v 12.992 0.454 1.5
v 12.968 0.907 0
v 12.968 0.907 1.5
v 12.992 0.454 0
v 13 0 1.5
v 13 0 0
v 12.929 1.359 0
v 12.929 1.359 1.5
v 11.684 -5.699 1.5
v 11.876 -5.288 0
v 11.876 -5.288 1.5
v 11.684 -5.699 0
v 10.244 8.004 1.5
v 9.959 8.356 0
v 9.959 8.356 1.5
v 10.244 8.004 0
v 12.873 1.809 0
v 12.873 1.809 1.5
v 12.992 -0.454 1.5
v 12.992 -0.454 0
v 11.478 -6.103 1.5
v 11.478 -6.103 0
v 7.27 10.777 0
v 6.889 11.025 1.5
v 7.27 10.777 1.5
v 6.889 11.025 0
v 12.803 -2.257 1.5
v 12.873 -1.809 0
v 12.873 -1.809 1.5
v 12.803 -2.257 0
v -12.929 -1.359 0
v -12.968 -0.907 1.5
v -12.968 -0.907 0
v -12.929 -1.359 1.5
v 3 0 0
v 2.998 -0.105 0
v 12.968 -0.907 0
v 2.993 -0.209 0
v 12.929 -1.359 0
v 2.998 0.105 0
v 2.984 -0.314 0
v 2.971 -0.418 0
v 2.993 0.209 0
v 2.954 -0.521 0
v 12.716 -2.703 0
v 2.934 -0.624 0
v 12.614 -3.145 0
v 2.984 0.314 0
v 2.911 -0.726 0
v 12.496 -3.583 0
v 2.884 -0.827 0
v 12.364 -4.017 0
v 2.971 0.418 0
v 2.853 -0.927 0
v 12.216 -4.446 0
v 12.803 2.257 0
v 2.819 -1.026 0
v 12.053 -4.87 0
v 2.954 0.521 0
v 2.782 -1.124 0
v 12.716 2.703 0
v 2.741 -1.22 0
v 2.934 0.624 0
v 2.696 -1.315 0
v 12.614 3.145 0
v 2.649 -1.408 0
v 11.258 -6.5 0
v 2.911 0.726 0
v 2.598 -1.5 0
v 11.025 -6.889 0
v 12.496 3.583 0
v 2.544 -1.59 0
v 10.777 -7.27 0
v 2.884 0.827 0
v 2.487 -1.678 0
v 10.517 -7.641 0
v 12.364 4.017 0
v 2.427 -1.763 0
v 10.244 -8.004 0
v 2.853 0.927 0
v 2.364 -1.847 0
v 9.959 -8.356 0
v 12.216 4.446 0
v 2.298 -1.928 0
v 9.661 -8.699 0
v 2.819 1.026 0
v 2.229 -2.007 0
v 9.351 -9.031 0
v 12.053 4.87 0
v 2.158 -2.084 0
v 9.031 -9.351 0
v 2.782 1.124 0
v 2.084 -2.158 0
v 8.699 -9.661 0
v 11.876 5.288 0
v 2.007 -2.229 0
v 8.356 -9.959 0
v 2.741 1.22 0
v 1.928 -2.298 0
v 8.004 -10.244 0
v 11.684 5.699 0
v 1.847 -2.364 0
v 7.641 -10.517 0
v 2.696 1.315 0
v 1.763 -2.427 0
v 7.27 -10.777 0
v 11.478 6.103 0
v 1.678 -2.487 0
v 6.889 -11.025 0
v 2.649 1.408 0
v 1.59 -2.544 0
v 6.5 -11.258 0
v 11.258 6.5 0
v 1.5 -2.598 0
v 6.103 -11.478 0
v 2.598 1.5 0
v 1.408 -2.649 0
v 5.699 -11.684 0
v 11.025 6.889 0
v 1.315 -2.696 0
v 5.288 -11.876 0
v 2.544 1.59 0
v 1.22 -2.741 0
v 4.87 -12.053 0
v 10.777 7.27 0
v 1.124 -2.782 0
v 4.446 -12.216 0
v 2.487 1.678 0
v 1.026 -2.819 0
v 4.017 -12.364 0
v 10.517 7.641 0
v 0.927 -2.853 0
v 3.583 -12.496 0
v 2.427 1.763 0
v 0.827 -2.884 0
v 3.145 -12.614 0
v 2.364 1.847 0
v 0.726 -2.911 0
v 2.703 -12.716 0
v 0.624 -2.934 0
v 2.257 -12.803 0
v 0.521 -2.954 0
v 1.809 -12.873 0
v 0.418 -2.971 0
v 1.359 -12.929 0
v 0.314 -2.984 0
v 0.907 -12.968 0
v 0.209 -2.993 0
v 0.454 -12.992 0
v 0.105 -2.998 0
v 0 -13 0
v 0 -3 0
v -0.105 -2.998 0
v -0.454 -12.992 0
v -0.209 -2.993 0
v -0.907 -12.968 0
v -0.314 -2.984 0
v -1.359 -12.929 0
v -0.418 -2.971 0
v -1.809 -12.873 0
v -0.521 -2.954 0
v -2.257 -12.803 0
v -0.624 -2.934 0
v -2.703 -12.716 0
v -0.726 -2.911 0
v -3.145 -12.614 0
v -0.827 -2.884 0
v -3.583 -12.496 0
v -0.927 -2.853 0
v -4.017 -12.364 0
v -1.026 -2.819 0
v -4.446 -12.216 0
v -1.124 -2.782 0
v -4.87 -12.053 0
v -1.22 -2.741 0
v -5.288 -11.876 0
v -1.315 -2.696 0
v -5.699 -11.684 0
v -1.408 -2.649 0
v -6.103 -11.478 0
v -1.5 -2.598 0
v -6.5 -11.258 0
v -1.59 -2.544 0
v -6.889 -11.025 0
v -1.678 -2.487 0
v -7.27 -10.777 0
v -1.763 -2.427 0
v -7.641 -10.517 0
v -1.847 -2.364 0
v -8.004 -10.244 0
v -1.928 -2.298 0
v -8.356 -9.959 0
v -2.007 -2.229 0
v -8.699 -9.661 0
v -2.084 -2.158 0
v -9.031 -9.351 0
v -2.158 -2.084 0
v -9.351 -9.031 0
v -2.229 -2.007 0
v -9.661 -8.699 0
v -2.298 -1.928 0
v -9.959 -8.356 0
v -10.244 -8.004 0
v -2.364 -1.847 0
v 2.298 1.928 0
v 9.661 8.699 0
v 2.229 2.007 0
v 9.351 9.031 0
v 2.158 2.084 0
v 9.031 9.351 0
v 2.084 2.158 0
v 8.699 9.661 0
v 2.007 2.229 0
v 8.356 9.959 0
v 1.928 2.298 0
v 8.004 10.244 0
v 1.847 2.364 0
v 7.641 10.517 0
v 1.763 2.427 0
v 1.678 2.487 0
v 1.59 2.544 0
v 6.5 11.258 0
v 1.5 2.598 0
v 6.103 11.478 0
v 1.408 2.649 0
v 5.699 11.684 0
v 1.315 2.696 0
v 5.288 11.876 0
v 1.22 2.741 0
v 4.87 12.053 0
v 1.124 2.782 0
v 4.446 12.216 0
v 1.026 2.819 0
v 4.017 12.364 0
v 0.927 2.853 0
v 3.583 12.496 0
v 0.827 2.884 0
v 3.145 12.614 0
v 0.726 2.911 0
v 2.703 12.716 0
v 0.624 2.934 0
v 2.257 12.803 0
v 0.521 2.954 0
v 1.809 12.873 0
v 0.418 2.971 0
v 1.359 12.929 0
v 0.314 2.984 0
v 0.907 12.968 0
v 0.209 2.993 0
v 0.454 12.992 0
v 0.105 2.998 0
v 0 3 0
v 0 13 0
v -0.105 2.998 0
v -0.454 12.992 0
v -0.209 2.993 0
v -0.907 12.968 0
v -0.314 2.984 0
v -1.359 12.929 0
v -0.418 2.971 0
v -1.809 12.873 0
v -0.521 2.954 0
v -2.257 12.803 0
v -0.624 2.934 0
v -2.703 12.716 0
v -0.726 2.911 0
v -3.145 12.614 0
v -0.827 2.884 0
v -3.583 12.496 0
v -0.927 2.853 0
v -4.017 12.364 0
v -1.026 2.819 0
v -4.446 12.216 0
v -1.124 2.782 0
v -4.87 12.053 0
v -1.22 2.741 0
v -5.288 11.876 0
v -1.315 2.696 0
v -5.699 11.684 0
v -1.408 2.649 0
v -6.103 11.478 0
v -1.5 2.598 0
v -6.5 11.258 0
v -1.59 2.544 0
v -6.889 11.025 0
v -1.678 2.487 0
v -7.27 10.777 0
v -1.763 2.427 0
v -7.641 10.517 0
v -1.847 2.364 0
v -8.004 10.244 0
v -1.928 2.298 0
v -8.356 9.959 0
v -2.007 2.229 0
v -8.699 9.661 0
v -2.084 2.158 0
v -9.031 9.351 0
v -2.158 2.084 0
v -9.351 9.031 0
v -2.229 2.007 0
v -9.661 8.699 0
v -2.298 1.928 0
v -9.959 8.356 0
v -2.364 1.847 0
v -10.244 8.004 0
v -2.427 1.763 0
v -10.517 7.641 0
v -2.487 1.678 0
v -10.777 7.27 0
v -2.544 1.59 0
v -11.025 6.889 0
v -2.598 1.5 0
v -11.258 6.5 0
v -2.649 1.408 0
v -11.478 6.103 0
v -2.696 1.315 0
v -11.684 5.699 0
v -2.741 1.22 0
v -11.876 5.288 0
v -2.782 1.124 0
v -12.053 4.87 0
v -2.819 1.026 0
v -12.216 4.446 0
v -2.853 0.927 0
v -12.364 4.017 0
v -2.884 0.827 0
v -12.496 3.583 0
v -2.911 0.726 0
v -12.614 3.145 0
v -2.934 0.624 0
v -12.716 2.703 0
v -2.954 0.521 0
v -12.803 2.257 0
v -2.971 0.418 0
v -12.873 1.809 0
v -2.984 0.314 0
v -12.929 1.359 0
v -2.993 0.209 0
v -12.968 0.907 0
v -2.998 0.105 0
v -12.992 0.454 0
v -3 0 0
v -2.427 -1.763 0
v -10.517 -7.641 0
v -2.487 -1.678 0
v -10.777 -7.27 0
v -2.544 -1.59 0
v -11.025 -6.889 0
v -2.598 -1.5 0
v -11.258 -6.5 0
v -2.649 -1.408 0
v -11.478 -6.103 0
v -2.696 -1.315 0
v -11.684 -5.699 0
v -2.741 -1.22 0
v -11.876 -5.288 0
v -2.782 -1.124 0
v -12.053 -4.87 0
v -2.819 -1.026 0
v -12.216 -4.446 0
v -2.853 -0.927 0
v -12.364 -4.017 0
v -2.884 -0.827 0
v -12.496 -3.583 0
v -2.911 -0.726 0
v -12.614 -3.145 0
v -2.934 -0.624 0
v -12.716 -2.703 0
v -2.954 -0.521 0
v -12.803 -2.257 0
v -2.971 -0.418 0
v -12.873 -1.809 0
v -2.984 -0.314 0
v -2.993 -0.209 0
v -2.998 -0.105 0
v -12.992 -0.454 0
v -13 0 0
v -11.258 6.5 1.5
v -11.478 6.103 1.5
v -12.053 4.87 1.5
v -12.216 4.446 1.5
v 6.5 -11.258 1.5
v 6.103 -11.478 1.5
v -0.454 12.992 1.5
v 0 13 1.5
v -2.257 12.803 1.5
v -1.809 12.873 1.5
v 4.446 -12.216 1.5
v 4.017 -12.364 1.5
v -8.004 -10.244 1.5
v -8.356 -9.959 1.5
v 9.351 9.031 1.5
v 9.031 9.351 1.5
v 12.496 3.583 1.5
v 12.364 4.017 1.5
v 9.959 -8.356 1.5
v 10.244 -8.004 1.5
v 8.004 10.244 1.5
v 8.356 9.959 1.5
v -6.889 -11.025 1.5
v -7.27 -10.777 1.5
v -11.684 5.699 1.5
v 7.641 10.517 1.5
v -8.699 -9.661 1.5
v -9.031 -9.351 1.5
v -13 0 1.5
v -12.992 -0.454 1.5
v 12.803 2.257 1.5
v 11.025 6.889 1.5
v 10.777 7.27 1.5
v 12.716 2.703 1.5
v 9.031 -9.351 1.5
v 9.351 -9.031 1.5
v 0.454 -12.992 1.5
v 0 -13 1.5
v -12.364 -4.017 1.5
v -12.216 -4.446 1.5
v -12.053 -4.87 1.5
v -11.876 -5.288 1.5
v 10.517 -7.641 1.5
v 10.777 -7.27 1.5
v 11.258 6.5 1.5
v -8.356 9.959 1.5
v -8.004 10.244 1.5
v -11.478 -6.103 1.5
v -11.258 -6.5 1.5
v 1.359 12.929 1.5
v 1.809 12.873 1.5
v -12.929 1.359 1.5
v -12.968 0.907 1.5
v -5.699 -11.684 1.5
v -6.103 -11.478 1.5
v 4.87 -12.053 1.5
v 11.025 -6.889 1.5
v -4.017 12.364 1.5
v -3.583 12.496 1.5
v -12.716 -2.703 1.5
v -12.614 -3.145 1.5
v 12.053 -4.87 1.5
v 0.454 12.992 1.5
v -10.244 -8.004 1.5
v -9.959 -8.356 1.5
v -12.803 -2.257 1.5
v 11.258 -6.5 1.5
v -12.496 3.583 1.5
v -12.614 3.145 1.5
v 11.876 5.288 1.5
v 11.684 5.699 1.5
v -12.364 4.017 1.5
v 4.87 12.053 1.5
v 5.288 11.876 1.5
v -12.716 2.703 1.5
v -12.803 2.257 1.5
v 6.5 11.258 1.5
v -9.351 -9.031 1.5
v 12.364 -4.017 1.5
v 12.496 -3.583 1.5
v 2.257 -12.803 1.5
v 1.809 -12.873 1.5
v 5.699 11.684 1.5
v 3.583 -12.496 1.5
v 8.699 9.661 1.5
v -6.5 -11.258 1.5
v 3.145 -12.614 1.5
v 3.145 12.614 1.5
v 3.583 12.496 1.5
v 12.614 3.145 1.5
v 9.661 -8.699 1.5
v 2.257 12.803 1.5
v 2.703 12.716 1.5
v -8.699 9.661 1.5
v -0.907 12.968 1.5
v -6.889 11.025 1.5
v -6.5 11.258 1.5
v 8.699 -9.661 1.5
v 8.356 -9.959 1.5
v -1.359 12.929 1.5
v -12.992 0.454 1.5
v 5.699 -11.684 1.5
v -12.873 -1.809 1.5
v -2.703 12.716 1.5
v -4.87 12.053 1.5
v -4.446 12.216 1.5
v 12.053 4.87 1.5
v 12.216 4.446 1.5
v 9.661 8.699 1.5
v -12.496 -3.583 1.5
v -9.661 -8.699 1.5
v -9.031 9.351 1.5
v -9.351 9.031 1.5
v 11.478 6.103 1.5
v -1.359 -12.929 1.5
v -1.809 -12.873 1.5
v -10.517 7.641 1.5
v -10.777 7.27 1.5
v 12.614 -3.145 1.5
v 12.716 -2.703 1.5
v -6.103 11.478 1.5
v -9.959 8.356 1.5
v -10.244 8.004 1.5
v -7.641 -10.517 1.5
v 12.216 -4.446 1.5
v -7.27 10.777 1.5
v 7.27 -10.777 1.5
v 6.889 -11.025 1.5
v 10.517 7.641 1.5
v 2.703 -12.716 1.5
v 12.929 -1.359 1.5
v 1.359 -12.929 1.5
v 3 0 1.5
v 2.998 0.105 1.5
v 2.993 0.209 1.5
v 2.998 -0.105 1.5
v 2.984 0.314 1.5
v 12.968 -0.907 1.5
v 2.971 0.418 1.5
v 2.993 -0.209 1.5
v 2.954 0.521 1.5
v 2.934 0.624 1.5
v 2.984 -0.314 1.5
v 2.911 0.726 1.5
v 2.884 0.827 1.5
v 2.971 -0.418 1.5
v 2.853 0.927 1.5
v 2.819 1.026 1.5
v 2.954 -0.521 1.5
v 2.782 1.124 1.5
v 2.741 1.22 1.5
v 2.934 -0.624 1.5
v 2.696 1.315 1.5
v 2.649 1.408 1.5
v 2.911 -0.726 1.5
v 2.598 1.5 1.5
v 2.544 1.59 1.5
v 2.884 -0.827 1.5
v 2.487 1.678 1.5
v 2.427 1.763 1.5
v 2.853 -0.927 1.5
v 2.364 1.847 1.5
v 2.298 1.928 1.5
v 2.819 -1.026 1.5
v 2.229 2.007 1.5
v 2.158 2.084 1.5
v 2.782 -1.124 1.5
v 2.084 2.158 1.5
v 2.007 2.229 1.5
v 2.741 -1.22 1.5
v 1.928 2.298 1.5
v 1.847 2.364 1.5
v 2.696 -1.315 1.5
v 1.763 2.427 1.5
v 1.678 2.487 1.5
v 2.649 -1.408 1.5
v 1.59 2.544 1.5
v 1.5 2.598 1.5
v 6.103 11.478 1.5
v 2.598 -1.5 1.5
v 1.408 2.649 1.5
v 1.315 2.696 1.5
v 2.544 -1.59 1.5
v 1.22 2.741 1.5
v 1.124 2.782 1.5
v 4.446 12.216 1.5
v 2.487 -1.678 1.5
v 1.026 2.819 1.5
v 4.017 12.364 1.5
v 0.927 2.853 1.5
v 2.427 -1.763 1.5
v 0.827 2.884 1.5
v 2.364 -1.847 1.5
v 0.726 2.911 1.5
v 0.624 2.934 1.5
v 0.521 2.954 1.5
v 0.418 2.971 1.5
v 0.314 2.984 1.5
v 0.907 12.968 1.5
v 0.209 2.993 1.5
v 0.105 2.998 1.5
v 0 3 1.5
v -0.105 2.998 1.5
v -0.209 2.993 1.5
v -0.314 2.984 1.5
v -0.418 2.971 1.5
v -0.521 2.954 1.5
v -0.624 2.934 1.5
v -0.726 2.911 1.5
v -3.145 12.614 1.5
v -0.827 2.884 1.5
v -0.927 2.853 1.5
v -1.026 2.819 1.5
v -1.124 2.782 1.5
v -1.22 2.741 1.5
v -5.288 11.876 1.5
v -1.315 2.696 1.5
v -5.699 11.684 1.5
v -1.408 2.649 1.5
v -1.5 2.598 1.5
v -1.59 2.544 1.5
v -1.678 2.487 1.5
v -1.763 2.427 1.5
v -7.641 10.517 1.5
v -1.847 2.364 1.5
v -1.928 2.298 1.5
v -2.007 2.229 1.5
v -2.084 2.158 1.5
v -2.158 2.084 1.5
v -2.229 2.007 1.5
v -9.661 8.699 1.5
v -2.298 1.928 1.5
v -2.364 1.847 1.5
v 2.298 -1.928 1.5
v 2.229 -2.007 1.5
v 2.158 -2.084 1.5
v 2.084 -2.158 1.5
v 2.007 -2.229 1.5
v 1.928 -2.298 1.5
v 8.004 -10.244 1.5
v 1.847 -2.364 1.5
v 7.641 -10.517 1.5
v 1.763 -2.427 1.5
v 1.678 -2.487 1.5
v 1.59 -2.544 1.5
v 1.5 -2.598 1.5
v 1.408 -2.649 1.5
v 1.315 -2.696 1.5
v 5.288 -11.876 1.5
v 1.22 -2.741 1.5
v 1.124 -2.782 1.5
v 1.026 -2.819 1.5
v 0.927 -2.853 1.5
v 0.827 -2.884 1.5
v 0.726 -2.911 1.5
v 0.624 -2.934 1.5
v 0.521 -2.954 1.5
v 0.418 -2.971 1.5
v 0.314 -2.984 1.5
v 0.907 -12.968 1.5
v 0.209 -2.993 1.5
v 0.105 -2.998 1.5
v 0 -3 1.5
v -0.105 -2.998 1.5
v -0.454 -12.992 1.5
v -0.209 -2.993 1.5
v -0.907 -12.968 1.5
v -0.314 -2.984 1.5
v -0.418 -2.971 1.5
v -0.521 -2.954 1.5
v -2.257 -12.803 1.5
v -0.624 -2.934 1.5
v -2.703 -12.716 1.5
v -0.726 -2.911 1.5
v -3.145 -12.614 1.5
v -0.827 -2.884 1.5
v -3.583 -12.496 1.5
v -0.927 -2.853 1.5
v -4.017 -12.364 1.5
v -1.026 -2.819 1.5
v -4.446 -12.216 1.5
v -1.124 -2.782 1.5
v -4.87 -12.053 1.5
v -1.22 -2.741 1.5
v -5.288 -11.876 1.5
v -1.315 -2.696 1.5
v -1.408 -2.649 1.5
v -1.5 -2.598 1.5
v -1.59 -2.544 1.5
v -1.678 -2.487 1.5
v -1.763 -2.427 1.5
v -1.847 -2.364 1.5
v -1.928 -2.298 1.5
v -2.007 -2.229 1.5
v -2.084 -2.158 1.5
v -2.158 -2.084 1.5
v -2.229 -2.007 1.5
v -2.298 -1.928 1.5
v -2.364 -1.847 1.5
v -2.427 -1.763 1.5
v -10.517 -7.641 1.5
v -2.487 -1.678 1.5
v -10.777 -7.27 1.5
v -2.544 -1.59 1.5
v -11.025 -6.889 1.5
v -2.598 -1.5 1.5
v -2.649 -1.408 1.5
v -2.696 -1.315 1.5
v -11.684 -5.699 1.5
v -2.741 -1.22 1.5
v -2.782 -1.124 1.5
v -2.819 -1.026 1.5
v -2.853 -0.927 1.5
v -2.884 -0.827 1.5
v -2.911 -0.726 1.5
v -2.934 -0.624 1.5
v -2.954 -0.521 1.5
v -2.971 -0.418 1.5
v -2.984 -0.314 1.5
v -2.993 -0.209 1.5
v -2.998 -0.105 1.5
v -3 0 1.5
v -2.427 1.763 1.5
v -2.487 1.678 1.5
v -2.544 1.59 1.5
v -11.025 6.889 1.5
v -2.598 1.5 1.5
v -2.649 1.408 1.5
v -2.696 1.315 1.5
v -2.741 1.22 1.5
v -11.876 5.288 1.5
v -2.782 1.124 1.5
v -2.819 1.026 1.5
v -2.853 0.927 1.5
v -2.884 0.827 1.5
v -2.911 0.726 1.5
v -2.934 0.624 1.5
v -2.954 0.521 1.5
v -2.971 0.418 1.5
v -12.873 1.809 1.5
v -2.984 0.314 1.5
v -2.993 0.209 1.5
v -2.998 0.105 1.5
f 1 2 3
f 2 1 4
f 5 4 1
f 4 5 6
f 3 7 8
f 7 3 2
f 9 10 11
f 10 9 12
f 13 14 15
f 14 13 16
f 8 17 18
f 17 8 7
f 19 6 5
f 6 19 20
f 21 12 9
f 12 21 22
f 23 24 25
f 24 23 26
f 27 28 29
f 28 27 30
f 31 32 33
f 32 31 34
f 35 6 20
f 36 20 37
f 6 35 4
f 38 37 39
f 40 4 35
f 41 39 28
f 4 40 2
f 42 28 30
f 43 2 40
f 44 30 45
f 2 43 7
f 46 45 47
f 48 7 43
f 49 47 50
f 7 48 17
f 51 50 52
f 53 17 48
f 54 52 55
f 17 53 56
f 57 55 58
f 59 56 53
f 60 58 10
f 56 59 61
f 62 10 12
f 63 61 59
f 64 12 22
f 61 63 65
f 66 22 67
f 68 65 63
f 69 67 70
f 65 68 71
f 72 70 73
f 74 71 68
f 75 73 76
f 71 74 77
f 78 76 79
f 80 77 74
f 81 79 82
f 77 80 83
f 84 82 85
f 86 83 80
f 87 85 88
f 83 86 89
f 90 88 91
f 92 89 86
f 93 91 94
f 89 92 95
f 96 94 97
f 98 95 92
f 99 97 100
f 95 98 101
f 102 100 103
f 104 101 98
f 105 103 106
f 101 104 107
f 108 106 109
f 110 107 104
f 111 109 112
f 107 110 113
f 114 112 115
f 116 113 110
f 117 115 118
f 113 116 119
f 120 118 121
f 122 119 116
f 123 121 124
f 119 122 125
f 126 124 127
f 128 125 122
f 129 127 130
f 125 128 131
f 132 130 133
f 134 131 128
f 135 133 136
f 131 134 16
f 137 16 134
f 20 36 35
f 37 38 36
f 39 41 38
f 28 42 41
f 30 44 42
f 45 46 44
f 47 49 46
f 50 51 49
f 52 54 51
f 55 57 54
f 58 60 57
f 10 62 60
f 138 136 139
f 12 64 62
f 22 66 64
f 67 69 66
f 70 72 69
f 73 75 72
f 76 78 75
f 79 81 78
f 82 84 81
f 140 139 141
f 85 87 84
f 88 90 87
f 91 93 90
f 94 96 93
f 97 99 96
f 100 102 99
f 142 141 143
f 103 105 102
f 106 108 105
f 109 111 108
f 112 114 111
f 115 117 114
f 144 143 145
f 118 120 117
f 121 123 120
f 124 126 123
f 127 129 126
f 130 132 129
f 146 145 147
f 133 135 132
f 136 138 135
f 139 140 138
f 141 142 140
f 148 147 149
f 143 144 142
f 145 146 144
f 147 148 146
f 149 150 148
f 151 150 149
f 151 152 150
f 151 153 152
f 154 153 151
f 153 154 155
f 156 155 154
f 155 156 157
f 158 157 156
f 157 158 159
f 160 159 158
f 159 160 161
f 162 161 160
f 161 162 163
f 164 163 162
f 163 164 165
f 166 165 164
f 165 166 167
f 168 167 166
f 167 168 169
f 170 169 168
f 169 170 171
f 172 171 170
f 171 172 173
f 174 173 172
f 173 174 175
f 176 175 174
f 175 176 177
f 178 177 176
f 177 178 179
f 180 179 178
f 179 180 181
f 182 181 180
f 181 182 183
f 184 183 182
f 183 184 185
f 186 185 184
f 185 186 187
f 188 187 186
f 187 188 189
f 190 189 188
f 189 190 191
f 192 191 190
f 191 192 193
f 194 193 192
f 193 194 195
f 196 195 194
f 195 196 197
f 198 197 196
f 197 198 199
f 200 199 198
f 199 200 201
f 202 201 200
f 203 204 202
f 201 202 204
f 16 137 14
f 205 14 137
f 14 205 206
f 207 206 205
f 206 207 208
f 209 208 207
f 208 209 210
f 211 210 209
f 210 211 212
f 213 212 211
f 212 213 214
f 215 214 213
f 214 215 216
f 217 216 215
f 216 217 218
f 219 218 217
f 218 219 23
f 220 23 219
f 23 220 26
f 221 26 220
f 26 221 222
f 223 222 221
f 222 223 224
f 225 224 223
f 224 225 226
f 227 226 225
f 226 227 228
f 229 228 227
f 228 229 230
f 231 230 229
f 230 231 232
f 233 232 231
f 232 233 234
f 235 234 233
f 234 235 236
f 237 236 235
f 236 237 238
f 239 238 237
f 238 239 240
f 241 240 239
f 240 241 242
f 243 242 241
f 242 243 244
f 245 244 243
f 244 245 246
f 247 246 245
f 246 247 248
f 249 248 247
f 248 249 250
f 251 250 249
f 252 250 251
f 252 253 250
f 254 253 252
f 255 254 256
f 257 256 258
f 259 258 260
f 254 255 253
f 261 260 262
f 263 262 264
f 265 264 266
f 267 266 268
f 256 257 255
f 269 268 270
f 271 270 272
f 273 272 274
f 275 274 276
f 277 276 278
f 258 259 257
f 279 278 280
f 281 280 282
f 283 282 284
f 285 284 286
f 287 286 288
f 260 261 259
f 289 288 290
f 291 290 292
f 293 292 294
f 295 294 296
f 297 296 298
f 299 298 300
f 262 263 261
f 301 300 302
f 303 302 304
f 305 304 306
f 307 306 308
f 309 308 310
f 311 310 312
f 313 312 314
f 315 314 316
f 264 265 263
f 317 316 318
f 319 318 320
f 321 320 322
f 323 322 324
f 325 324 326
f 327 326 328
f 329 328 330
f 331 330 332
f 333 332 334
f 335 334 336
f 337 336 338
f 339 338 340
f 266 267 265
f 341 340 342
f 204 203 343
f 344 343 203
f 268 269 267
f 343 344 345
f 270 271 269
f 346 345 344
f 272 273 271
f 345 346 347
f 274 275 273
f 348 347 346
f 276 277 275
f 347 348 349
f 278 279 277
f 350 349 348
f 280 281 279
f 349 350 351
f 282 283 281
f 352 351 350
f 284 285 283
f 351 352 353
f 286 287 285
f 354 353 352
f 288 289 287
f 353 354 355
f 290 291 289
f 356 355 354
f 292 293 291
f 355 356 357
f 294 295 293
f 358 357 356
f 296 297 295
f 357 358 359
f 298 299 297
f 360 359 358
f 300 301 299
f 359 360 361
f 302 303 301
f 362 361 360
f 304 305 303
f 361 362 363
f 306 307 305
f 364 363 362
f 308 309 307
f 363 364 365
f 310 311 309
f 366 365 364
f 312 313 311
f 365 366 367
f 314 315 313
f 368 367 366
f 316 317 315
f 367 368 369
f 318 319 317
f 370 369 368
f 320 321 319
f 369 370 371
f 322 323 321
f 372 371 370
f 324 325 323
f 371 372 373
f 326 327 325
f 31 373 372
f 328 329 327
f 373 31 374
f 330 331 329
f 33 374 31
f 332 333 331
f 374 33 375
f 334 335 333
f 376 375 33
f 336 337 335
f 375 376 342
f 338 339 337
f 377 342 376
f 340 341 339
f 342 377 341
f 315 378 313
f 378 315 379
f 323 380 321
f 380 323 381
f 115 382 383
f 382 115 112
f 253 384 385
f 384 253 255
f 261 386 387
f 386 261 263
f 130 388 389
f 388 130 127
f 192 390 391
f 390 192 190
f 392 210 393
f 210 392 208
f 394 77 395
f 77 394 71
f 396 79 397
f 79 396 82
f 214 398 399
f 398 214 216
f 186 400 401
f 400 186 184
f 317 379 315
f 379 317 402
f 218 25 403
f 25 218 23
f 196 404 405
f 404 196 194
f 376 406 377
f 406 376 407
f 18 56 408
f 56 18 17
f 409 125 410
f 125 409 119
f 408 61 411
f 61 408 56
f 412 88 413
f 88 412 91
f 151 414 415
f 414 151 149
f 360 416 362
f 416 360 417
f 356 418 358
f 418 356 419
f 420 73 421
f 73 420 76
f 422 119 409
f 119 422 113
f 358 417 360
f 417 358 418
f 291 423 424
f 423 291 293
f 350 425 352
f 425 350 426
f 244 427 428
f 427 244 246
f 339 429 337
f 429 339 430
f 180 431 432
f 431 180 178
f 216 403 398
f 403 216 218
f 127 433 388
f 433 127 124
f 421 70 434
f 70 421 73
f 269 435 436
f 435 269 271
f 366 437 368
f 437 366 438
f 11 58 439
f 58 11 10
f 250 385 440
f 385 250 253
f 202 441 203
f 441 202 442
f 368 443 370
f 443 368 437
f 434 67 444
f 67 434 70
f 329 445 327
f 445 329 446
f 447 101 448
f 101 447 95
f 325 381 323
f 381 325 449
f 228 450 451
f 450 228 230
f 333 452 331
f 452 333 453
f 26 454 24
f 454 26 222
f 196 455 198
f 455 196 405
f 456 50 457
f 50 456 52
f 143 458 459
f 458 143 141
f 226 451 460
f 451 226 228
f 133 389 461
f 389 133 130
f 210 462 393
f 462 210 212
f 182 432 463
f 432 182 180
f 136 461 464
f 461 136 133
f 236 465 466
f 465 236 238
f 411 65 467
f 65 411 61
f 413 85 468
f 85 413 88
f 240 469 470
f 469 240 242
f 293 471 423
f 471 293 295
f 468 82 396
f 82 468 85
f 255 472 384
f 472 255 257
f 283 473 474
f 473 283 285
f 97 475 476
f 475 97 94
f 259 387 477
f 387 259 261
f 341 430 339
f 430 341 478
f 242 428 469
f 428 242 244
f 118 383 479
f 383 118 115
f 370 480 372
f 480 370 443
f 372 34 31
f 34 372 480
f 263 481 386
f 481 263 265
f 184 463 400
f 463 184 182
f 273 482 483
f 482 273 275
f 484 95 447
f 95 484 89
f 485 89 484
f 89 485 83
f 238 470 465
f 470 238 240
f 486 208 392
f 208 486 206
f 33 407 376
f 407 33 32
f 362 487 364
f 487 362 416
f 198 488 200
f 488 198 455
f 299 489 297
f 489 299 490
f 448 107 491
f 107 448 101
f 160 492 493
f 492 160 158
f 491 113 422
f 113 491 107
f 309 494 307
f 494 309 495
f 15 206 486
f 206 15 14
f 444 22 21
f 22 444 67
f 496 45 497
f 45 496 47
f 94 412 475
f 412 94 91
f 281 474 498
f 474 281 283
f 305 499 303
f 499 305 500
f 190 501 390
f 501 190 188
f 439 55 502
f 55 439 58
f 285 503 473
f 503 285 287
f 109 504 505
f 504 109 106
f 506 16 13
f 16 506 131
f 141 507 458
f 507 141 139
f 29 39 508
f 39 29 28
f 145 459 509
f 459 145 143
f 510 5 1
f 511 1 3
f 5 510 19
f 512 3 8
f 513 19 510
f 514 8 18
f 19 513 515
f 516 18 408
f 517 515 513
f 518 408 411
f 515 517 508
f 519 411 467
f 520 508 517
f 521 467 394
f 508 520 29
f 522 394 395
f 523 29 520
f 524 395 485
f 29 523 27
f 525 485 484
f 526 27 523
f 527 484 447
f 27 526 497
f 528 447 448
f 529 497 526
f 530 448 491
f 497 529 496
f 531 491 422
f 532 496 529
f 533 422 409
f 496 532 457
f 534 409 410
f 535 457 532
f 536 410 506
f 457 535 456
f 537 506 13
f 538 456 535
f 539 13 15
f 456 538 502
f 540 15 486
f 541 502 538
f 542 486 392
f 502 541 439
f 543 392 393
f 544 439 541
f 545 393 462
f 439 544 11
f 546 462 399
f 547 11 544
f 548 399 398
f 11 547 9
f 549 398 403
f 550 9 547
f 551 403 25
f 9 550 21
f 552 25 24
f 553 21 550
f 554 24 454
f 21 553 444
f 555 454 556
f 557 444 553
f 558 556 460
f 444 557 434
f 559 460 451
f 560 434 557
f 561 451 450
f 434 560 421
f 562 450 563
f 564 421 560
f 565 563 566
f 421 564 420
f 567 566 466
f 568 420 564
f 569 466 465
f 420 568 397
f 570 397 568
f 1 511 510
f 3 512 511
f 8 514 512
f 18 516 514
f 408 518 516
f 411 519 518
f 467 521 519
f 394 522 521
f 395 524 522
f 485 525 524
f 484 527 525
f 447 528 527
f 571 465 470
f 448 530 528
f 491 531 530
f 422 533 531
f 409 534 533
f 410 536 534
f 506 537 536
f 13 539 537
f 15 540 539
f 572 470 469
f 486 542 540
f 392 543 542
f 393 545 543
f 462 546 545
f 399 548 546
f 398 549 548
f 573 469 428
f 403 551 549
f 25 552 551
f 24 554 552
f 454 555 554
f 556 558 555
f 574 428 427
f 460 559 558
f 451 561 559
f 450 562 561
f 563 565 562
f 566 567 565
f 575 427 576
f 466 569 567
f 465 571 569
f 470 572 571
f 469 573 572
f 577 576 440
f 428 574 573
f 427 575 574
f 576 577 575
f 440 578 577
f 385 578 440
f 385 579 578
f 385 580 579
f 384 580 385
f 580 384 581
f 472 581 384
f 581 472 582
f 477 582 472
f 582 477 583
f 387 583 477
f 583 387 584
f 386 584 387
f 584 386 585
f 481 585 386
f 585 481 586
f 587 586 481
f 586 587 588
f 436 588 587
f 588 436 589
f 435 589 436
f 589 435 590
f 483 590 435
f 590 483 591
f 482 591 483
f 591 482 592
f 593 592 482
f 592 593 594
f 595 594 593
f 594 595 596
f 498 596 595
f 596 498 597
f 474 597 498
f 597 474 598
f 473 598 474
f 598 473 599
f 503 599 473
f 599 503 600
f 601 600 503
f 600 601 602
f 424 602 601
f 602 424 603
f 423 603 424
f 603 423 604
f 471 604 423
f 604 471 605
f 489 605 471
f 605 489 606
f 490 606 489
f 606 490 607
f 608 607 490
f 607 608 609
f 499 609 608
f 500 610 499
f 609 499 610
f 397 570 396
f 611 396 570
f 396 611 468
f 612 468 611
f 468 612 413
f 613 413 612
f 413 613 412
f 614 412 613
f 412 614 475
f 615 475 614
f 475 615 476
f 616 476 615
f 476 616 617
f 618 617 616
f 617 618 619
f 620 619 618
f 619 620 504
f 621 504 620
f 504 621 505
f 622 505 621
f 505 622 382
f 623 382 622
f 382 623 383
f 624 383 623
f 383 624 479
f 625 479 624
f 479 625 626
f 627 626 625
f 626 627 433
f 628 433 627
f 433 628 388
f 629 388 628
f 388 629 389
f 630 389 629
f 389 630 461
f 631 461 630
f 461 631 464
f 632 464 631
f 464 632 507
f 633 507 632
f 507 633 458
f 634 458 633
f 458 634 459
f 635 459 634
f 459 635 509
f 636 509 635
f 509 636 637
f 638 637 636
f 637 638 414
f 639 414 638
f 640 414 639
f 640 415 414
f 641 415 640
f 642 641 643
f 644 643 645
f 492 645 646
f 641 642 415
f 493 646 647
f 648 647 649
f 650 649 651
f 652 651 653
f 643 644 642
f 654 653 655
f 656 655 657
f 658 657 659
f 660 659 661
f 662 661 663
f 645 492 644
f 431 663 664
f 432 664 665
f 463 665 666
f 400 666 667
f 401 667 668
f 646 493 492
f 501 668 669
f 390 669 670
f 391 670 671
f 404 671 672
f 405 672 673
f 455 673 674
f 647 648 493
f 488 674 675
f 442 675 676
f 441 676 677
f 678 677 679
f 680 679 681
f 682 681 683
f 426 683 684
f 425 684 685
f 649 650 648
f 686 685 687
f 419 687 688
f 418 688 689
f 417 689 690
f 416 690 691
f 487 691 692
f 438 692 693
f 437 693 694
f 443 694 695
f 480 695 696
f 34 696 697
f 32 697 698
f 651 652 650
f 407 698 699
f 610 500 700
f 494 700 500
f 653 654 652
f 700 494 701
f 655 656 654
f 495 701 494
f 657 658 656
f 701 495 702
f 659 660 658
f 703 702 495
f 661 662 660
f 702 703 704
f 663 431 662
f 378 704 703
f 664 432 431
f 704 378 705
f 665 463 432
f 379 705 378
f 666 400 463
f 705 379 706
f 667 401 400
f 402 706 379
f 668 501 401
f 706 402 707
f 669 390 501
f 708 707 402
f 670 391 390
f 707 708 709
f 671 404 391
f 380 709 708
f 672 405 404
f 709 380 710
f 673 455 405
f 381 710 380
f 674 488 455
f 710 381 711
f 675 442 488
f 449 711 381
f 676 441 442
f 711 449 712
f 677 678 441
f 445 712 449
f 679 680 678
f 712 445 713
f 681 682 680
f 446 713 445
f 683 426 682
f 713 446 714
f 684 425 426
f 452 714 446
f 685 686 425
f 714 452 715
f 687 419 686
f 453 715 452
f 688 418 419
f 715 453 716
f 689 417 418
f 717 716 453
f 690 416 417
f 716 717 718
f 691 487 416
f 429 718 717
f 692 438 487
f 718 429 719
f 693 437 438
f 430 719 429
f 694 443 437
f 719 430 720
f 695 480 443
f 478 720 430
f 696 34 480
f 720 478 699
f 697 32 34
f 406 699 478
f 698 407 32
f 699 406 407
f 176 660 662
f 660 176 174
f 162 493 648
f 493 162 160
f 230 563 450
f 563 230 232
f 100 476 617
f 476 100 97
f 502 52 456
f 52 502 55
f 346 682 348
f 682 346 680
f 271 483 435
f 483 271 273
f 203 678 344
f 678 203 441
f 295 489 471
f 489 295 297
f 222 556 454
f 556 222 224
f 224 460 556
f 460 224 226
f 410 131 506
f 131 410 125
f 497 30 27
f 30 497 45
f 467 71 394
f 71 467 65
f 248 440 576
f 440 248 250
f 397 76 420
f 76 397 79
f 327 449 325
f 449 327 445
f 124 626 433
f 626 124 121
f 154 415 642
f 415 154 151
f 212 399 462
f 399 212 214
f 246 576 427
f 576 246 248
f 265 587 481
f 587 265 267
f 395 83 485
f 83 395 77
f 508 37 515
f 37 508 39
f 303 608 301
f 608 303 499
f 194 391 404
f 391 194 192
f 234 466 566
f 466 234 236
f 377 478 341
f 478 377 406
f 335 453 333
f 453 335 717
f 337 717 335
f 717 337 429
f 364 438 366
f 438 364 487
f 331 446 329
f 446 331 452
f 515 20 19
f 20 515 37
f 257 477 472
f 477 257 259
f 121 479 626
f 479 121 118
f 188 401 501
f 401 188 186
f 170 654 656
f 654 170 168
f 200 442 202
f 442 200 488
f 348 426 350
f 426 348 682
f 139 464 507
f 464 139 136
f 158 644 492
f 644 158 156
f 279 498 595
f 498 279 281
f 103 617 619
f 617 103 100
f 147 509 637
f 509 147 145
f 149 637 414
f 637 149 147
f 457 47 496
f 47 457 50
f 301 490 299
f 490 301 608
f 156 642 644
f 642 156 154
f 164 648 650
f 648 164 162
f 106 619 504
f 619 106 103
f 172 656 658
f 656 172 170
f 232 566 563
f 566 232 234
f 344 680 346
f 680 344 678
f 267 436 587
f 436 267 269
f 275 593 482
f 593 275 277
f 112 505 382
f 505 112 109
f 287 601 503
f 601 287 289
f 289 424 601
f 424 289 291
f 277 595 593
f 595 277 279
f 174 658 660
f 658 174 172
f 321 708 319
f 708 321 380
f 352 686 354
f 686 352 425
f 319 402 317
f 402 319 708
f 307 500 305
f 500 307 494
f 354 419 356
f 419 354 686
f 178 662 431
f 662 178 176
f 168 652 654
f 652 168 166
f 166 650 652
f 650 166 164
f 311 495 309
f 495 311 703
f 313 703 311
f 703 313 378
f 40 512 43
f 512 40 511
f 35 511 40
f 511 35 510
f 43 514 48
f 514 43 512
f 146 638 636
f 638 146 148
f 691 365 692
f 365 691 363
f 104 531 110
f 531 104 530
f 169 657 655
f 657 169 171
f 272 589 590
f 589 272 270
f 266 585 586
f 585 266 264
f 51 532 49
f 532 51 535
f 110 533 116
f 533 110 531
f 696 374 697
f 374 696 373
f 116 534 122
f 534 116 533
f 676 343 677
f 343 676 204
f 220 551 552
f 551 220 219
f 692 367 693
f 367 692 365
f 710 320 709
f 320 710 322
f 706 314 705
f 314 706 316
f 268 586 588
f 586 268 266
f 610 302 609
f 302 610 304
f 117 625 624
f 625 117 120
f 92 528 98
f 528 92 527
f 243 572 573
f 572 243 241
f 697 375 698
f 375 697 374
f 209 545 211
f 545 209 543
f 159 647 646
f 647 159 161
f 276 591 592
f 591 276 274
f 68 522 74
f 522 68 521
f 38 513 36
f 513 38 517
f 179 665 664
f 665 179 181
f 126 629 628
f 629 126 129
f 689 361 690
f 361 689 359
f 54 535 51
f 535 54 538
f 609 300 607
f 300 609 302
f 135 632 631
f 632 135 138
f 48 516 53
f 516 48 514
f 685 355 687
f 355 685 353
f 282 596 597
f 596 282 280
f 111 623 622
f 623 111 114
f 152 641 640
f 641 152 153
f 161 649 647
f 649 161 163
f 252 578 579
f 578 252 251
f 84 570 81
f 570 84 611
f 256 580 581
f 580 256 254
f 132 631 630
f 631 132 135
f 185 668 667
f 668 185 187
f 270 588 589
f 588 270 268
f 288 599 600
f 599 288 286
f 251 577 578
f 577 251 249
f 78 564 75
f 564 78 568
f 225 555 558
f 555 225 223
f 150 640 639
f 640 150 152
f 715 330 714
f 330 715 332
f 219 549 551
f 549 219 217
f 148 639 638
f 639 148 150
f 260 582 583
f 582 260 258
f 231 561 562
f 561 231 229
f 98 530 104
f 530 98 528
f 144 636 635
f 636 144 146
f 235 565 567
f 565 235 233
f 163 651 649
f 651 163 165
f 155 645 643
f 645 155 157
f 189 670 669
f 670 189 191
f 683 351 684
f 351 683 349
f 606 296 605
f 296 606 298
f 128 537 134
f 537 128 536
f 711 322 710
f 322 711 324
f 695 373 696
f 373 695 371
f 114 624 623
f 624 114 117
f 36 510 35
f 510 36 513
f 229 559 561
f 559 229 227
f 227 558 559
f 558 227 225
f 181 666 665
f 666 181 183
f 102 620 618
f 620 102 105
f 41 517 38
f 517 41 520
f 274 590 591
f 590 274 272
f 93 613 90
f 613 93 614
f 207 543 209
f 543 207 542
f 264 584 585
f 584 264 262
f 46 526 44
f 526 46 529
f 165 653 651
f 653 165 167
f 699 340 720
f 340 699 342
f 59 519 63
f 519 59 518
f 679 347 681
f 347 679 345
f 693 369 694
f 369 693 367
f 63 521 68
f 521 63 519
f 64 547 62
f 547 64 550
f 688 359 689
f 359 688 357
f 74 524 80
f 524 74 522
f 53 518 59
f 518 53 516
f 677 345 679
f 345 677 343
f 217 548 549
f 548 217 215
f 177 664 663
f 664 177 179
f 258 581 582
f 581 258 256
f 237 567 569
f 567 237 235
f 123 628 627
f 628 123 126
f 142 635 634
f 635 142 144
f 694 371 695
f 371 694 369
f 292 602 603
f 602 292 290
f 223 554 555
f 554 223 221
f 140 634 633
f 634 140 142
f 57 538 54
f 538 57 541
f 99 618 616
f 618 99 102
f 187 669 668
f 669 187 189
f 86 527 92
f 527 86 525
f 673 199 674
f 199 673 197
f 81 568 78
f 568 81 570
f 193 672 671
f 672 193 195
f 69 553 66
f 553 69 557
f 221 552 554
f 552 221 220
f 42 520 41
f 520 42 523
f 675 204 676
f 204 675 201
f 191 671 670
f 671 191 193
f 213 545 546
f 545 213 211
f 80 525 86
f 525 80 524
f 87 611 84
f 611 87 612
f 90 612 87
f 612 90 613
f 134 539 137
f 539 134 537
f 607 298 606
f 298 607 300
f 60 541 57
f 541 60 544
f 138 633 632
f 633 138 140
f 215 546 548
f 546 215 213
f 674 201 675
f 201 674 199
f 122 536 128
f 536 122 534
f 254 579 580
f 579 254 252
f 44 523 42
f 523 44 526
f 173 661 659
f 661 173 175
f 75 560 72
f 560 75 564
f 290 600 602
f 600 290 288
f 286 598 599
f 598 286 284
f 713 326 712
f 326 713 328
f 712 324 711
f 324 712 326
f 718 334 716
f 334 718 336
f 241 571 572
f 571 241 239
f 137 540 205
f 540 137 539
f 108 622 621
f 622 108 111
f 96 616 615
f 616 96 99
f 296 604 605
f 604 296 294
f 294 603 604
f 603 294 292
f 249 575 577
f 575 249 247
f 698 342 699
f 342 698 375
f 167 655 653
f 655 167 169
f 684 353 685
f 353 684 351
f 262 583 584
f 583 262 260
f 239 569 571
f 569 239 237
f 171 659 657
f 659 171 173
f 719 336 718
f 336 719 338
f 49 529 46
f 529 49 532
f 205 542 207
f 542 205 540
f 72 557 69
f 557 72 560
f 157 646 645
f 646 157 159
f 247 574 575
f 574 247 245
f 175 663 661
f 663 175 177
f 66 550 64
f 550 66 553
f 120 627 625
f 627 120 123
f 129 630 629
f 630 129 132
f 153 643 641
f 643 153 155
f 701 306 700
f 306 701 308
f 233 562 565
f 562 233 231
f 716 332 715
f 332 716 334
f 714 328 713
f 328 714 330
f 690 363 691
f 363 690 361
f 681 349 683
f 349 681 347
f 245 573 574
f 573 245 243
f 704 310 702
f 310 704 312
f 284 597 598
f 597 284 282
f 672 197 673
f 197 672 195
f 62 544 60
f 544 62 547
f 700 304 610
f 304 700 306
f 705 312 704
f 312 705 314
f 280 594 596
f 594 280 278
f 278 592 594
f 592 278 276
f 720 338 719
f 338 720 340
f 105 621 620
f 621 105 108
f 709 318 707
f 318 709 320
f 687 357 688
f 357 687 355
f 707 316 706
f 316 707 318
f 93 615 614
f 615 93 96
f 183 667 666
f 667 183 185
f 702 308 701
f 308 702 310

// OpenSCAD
$fn = 180;

inner_d = 6.0;
outer_d = 26.0;
thickness = 1.5;

difference() {
  cylinder(h = thickness, d = outer_d);
  translate([0, 0, -0.1])
    cylinder(h = thickness + 0.2, d = inner_d);
}
